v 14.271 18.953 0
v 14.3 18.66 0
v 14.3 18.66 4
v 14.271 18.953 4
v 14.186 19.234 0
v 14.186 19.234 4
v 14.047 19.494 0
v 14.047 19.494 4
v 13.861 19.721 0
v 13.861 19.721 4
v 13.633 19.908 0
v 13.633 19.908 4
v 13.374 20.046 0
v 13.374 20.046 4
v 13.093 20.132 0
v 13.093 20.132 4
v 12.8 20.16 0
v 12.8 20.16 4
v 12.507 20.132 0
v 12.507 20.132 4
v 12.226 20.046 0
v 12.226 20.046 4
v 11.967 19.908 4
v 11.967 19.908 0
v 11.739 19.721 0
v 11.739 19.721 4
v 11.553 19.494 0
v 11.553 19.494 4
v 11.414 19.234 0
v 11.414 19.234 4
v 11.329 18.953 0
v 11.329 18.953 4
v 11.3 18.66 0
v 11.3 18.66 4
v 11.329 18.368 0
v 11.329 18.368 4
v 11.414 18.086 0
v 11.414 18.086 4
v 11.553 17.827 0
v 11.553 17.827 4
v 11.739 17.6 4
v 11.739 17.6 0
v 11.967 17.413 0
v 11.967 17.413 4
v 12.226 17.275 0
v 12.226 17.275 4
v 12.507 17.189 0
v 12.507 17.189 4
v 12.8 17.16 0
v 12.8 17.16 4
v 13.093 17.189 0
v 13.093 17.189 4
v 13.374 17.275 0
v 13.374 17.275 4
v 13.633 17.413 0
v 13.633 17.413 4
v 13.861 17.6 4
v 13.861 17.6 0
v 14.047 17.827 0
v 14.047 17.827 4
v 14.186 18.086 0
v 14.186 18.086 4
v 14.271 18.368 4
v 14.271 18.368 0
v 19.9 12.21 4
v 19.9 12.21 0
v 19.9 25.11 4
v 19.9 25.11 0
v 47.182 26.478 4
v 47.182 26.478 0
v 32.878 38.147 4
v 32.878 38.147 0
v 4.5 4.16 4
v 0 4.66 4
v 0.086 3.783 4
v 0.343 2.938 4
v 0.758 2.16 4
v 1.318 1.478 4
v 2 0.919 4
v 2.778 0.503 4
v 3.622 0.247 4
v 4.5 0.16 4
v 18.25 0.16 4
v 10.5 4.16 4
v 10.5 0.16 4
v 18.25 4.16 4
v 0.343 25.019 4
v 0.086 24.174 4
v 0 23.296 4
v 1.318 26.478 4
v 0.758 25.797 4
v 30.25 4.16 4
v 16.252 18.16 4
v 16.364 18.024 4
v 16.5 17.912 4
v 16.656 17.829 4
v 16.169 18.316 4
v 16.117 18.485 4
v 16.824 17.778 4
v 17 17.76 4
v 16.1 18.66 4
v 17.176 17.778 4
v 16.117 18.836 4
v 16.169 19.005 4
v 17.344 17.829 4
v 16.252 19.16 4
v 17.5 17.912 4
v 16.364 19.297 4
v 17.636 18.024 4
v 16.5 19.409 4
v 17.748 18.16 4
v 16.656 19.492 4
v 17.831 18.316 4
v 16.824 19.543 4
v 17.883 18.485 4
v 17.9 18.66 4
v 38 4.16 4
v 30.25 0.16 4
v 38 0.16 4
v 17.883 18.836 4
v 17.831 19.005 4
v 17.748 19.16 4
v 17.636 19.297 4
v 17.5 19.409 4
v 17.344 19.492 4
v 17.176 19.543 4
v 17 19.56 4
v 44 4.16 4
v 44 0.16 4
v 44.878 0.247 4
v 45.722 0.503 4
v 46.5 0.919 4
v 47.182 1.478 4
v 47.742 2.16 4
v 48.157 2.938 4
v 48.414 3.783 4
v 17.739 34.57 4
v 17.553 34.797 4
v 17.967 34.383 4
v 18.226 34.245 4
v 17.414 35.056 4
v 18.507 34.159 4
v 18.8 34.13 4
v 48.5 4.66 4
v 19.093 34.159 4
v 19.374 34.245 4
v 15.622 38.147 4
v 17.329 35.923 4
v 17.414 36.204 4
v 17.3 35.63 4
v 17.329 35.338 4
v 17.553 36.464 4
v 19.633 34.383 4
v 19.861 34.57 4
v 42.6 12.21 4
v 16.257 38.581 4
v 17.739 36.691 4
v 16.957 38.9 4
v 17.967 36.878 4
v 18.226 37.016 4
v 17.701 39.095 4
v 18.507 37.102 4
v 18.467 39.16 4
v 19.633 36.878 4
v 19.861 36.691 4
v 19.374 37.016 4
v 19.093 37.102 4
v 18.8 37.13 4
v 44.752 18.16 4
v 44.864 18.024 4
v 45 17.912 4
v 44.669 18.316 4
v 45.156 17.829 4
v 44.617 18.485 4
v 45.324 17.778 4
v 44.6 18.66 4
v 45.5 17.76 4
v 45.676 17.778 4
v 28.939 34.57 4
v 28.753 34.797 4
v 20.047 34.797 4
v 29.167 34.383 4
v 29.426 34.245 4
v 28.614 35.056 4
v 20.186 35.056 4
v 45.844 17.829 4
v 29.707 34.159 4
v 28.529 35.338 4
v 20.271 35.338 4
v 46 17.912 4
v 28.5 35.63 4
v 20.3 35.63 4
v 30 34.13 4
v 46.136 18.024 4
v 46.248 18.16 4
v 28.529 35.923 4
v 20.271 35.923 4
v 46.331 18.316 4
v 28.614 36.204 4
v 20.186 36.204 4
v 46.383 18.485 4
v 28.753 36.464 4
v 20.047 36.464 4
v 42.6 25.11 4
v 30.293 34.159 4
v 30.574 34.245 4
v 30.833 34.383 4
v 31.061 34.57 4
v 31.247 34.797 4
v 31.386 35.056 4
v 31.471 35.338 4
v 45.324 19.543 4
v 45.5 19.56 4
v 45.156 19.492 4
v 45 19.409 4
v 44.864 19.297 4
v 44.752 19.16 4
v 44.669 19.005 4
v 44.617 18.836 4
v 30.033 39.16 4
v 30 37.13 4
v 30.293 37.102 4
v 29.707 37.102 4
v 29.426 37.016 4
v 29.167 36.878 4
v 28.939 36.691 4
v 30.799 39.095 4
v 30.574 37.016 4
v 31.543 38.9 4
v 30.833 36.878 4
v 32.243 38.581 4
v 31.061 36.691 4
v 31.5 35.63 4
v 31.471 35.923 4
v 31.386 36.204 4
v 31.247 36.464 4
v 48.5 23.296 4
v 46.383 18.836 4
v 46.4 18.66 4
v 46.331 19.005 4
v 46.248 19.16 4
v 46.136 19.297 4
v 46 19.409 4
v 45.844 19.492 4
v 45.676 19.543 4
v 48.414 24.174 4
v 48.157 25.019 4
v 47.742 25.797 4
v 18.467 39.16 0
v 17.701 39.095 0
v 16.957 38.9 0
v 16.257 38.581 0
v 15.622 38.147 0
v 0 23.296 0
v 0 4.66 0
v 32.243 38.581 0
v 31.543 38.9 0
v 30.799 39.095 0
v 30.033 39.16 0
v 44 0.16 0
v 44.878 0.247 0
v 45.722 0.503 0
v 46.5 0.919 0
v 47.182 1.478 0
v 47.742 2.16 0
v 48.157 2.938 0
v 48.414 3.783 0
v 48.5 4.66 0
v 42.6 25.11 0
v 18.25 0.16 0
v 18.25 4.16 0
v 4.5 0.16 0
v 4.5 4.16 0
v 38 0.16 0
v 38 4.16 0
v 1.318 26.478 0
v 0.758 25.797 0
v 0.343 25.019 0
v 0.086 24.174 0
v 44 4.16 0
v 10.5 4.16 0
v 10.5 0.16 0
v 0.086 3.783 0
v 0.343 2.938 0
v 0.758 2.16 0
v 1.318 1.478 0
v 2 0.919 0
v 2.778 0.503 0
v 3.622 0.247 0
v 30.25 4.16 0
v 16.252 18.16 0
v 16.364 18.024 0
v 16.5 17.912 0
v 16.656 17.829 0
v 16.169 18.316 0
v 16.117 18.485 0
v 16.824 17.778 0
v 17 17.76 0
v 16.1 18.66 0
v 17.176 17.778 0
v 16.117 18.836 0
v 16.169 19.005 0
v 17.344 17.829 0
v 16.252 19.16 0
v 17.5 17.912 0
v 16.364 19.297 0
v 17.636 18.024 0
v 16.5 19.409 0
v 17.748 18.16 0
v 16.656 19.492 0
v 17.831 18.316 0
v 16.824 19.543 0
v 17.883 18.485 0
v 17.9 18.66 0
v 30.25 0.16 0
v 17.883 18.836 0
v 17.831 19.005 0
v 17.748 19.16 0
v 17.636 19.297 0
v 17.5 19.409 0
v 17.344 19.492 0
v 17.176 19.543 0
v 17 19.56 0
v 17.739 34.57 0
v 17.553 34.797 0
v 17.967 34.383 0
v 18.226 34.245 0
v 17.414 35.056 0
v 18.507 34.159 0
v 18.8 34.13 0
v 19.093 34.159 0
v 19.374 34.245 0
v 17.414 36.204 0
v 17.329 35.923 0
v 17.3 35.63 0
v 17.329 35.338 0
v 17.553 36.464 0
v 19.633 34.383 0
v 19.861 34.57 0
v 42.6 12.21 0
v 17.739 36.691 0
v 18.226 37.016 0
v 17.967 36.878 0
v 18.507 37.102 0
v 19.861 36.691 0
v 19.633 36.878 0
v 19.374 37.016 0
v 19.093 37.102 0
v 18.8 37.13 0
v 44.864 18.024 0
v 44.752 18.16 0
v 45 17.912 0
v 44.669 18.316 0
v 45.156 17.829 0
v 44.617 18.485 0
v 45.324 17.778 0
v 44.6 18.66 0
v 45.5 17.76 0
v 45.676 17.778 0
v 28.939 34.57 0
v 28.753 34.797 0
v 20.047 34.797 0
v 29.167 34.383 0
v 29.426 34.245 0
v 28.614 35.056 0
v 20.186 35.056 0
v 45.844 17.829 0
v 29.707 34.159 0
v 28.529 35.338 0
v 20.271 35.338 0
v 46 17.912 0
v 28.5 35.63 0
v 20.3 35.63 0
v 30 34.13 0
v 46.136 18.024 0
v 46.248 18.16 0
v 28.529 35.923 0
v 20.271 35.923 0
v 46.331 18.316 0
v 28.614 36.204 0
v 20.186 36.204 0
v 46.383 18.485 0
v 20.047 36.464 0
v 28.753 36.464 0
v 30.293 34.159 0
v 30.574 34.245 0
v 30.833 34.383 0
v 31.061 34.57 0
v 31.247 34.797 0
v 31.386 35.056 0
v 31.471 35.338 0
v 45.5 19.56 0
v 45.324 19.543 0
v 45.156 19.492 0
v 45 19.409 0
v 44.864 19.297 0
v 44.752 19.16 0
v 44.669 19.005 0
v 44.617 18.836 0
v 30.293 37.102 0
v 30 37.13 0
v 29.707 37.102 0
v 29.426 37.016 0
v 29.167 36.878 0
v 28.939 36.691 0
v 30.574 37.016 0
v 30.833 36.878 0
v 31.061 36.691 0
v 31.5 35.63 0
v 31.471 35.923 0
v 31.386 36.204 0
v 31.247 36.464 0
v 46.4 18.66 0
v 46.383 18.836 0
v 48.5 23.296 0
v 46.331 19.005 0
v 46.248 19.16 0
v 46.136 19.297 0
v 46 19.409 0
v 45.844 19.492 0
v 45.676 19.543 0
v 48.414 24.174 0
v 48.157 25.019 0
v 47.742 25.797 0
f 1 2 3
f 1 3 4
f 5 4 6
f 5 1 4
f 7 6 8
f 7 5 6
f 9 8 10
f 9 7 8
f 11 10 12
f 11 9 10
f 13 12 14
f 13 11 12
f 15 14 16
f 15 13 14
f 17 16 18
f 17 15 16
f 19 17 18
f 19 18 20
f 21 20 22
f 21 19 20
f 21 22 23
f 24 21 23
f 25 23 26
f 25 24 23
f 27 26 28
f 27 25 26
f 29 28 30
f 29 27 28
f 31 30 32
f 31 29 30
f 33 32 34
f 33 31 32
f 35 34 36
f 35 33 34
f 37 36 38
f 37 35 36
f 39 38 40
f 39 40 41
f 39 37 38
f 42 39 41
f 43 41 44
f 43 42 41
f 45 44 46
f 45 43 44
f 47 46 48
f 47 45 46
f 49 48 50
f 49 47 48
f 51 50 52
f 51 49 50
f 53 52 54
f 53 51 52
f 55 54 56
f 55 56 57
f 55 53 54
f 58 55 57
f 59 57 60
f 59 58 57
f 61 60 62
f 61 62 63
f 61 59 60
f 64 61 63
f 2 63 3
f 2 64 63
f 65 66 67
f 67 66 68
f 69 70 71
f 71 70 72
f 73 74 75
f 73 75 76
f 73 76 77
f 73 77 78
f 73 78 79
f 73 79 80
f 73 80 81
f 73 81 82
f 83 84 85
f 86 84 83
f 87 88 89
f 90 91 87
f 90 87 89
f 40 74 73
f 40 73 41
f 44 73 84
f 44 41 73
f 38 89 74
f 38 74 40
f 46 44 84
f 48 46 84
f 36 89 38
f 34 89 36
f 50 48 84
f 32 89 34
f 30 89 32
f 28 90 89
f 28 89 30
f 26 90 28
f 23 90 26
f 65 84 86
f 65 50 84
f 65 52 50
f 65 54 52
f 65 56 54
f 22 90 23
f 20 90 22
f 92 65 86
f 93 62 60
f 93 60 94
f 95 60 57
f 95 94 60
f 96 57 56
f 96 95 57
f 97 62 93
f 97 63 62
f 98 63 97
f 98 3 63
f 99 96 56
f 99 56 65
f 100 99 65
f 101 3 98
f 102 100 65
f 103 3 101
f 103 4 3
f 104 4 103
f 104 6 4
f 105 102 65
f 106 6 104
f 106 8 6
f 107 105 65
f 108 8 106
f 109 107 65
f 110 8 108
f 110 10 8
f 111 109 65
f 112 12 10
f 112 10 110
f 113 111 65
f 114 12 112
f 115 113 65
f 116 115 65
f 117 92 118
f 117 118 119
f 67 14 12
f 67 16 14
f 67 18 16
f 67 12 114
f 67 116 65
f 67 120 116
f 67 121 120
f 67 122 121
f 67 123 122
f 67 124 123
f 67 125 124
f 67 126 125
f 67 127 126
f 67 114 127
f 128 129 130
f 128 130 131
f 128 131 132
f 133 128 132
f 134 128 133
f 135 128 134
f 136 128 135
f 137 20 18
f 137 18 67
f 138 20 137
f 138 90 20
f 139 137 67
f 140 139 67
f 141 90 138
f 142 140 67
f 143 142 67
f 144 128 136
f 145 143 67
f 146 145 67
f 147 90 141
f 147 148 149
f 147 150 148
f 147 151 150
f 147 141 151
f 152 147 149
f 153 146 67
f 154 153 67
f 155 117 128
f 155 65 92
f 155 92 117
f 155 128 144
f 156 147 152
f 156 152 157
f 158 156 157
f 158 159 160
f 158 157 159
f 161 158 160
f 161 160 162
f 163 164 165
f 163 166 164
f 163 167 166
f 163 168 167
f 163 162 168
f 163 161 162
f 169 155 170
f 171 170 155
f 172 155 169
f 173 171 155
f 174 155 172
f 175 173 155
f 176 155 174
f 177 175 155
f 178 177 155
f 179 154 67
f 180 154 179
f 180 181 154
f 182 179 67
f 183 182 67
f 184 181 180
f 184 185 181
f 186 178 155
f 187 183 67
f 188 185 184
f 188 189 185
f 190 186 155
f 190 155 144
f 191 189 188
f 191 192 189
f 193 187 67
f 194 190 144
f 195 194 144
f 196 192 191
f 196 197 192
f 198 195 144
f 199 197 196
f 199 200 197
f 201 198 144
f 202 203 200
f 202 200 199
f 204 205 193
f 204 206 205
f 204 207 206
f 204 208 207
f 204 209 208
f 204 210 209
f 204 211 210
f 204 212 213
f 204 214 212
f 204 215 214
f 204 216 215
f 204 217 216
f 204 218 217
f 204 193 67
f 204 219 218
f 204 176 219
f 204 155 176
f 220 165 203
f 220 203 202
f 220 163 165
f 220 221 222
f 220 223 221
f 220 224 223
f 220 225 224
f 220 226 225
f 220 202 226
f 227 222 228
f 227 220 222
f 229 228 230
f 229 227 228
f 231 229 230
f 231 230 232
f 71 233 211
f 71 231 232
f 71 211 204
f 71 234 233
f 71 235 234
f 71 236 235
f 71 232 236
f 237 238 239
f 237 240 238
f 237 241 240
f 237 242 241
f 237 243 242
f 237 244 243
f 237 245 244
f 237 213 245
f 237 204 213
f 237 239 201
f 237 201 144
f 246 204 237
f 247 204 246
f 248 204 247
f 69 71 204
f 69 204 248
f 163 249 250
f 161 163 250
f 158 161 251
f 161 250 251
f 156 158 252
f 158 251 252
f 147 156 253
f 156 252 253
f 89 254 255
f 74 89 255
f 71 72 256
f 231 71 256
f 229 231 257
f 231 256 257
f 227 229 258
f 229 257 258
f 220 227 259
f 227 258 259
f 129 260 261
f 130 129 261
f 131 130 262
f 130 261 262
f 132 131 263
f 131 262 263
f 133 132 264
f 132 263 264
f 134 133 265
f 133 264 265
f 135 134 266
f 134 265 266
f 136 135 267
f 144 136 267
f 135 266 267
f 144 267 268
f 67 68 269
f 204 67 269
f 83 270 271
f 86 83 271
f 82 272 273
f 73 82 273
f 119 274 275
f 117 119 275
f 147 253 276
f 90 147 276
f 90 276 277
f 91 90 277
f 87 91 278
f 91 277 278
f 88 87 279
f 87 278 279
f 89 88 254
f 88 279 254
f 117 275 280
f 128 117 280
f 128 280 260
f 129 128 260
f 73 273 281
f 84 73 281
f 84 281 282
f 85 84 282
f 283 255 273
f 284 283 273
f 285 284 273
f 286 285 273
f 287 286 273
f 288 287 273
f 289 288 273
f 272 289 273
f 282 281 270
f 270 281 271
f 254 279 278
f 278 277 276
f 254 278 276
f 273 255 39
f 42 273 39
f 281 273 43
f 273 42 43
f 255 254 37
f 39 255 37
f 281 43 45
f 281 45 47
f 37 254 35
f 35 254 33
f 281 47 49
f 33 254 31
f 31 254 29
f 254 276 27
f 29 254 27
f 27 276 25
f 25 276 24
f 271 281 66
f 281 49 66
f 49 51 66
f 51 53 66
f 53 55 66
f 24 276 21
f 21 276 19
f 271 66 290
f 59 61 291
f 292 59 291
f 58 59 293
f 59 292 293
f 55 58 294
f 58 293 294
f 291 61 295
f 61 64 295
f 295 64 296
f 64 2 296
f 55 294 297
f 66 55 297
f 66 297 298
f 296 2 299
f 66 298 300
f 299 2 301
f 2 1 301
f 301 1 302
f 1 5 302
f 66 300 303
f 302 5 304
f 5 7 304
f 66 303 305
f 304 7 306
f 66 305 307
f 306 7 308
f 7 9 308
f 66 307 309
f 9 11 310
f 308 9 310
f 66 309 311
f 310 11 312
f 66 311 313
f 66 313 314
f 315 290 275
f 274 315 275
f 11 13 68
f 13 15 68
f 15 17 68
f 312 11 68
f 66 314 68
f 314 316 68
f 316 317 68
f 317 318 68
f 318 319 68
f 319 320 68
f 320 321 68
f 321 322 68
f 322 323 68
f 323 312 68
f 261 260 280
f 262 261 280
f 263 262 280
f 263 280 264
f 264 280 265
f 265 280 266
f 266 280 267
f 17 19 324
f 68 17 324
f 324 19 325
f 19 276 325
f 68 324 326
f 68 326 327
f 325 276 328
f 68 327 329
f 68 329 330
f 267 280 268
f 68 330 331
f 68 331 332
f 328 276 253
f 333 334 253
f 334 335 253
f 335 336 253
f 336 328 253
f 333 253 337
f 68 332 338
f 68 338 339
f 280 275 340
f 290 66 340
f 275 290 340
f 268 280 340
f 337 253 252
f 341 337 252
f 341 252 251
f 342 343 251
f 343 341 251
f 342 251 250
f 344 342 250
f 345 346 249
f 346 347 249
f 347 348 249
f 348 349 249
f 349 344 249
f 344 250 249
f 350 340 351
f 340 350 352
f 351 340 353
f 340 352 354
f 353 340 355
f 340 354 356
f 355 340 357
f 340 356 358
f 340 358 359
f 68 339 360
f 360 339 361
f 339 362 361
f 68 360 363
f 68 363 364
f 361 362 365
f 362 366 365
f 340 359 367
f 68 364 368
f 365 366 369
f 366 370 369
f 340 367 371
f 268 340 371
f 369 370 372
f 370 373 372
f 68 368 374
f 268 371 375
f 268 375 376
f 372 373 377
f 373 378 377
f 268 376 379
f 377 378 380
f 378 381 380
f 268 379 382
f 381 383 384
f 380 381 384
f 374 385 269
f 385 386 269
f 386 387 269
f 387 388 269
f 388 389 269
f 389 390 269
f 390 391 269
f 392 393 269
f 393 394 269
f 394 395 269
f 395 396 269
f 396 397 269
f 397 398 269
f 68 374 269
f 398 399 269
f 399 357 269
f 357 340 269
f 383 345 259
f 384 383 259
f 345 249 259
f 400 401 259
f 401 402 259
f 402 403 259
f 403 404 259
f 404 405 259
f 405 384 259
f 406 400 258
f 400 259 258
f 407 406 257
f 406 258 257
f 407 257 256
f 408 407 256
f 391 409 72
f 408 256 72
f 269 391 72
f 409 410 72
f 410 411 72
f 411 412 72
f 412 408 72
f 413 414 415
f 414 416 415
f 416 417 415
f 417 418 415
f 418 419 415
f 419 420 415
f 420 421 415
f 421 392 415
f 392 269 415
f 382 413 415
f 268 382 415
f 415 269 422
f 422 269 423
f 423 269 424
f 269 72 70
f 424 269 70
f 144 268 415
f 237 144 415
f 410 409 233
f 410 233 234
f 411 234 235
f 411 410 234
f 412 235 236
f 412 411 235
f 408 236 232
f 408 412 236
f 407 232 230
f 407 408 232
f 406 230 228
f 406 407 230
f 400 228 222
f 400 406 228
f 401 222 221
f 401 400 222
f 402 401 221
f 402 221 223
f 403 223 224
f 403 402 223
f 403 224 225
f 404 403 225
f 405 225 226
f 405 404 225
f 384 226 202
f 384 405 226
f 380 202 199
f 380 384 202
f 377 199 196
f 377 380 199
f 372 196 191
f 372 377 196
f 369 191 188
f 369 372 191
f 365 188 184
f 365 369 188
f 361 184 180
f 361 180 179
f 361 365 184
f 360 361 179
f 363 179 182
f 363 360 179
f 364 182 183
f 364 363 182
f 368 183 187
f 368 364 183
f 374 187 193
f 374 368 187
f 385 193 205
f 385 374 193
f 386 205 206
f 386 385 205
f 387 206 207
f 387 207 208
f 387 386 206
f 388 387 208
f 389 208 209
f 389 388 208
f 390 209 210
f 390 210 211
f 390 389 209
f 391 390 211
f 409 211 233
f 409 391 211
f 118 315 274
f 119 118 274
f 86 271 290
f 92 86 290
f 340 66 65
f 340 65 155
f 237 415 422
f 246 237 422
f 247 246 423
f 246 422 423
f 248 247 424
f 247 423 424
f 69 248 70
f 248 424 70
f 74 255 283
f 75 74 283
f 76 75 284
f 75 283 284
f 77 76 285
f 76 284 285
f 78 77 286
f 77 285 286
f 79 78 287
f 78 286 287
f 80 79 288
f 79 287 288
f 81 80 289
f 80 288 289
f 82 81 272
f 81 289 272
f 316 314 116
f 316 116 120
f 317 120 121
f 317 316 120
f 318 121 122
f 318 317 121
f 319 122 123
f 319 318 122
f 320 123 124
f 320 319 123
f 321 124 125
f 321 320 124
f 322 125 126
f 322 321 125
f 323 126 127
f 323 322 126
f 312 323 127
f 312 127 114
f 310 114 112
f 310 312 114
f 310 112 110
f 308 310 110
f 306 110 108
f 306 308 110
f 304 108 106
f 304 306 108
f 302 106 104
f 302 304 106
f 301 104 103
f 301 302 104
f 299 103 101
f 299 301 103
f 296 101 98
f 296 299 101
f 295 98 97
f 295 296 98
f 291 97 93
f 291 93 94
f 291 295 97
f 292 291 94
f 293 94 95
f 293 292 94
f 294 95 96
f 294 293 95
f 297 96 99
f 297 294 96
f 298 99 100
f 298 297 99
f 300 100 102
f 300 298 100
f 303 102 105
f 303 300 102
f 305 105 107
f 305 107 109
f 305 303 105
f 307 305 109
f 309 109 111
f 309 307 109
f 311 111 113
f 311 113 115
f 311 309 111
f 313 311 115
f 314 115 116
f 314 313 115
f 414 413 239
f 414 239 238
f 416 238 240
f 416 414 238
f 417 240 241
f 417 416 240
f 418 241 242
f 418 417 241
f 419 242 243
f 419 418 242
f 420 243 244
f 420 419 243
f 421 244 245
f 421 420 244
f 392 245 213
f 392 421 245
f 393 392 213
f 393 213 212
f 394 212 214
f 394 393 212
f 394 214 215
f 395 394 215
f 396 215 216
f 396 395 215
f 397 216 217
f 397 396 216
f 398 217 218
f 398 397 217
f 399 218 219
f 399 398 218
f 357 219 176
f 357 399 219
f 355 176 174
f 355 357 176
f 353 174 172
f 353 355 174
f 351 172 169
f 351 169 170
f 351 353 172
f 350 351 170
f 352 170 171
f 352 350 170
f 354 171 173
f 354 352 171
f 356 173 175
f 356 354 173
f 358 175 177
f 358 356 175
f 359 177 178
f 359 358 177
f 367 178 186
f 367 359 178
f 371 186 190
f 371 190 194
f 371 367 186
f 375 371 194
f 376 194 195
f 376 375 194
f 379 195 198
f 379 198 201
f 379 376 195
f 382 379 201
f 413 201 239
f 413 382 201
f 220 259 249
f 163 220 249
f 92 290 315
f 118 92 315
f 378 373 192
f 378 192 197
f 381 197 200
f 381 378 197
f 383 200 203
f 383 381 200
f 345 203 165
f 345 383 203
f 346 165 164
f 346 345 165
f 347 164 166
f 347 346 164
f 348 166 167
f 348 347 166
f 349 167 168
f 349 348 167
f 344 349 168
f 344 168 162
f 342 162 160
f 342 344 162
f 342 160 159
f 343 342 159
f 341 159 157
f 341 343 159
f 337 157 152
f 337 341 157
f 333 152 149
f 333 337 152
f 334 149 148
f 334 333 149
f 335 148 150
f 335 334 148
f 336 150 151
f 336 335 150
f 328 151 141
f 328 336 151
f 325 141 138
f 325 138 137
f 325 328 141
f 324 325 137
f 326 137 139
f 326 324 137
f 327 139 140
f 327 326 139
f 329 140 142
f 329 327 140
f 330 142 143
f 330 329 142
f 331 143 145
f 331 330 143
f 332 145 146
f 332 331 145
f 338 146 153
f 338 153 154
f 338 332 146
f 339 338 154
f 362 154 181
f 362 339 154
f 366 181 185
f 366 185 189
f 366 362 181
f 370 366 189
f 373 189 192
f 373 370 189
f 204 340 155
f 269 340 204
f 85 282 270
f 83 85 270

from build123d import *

# Parameters (mm, degrees)
SKETCH1_R           = 1.5
SKETCH1_R_2         = 0.9
SKETCH1_W           = 22.7
SKETCH1_H           = 12.9
BOSS_EXTRUDE1_DEPTH = 4


with BuildPart() as part:
    # Sketch1 → Boss-Extrude1 (new body)
    with BuildSketch(Plane.XY):
        with BuildLine():
            Line((48.50000085, 4.660421271), (48.50000085, 23.29646024))
            ThreePointArc((48.50000085, 23.29646024), (48.157458746, 25.018535686), (47.181981365, 26.478440755))
            Line((47.181981365, 26.478440755), (32.877904779, 38.147339677))
            ThreePointArc((32.877904779, 38.147339677), (31.543145465, 38.899591757), (30.033366148, 39.160421271))
            Line((30.033366148, 39.160421271), (18.466635551, 39.160421271))
            ThreePointArc((18.466635551, 39.160421271), (16.956856234, 38.899591757), (15.62209692, 38.147339677))
            Line((15.62209692, 38.147339677), (1.318020334, 26.478440755))
            ThreePointArc((1.318020334, 26.478440755), (0.342542953, 25.018535686), (8.5e-07, 23.29646024))
            Line((8.5e-07, 23.29646024), (8.5e-07, 4.660421271))
            ThreePointArc((8.5e-07, 4.660421271), (1.318020334, 1.478440755), (4.50000085, 0.160421271))
            Line((4.50000085, 0.160421271), (4.50000085, 4.160421271))
            Line((4.50000085, 4.160421271), (10.50000085, 4.160421271))
            Line((10.50000085, 4.160421271), (10.50000085, 0.160421271))
            Line((10.50000085, 0.160421271), (18.25000085, 0.160421271))
            Line((18.25000085, 0.160421271), (18.25000085, 4.160421271))
            Line((18.25000085, 4.160421271), (30.25000085, 4.160421271))
            Line((30.25000085, 4.160421271), (30.25000085, 0.160421271))
            Line((30.25000085, 0.160421271), (38.00000085, 0.160421271))
            Line((38.00000085, 0.160421271), (38.00000085, 4.160421271))
            Line((38.00000085, 4.160421271), (44.00000085, 4.160421271))
            Line((44.00000085, 4.160421271), (44.00000085, 0.160421271))
            ThreePointArc((44.00000085, 0.160421271), (47.181981365, 1.478440755), (48.50000085, 4.660421271))
        make_face()
        with Locations((12.80000085, 18.660421271)):
            Circle(SKETCH1_R, mode=Mode.SUBTRACT)
        with Locations((18.80000085, 35.630421271)):
            Circle(SKETCH1_R, mode=Mode.SUBTRACT)
        with Locations((30.00000085, 35.630421271)):
            Circle(SKETCH1_R, mode=Mode.SUBTRACT)
        with Locations((17.00000085, 18.660421271)):
            Circle(SKETCH1_R_2, mode=Mode.SUBTRACT)
        with Locations((45.50000085, 18.660421271)):
            Circle(SKETCH1_R_2, mode=Mode.SUBTRACT)
        with Locations((31.25000085, 18.660421271)):
            Rectangle(SKETCH1_W, SKETCH1_H, mode=Mode.SUBTRACT)
    extrude(amount=BOSS_EXTRUDE1_DEPTH)


solid = part.part
